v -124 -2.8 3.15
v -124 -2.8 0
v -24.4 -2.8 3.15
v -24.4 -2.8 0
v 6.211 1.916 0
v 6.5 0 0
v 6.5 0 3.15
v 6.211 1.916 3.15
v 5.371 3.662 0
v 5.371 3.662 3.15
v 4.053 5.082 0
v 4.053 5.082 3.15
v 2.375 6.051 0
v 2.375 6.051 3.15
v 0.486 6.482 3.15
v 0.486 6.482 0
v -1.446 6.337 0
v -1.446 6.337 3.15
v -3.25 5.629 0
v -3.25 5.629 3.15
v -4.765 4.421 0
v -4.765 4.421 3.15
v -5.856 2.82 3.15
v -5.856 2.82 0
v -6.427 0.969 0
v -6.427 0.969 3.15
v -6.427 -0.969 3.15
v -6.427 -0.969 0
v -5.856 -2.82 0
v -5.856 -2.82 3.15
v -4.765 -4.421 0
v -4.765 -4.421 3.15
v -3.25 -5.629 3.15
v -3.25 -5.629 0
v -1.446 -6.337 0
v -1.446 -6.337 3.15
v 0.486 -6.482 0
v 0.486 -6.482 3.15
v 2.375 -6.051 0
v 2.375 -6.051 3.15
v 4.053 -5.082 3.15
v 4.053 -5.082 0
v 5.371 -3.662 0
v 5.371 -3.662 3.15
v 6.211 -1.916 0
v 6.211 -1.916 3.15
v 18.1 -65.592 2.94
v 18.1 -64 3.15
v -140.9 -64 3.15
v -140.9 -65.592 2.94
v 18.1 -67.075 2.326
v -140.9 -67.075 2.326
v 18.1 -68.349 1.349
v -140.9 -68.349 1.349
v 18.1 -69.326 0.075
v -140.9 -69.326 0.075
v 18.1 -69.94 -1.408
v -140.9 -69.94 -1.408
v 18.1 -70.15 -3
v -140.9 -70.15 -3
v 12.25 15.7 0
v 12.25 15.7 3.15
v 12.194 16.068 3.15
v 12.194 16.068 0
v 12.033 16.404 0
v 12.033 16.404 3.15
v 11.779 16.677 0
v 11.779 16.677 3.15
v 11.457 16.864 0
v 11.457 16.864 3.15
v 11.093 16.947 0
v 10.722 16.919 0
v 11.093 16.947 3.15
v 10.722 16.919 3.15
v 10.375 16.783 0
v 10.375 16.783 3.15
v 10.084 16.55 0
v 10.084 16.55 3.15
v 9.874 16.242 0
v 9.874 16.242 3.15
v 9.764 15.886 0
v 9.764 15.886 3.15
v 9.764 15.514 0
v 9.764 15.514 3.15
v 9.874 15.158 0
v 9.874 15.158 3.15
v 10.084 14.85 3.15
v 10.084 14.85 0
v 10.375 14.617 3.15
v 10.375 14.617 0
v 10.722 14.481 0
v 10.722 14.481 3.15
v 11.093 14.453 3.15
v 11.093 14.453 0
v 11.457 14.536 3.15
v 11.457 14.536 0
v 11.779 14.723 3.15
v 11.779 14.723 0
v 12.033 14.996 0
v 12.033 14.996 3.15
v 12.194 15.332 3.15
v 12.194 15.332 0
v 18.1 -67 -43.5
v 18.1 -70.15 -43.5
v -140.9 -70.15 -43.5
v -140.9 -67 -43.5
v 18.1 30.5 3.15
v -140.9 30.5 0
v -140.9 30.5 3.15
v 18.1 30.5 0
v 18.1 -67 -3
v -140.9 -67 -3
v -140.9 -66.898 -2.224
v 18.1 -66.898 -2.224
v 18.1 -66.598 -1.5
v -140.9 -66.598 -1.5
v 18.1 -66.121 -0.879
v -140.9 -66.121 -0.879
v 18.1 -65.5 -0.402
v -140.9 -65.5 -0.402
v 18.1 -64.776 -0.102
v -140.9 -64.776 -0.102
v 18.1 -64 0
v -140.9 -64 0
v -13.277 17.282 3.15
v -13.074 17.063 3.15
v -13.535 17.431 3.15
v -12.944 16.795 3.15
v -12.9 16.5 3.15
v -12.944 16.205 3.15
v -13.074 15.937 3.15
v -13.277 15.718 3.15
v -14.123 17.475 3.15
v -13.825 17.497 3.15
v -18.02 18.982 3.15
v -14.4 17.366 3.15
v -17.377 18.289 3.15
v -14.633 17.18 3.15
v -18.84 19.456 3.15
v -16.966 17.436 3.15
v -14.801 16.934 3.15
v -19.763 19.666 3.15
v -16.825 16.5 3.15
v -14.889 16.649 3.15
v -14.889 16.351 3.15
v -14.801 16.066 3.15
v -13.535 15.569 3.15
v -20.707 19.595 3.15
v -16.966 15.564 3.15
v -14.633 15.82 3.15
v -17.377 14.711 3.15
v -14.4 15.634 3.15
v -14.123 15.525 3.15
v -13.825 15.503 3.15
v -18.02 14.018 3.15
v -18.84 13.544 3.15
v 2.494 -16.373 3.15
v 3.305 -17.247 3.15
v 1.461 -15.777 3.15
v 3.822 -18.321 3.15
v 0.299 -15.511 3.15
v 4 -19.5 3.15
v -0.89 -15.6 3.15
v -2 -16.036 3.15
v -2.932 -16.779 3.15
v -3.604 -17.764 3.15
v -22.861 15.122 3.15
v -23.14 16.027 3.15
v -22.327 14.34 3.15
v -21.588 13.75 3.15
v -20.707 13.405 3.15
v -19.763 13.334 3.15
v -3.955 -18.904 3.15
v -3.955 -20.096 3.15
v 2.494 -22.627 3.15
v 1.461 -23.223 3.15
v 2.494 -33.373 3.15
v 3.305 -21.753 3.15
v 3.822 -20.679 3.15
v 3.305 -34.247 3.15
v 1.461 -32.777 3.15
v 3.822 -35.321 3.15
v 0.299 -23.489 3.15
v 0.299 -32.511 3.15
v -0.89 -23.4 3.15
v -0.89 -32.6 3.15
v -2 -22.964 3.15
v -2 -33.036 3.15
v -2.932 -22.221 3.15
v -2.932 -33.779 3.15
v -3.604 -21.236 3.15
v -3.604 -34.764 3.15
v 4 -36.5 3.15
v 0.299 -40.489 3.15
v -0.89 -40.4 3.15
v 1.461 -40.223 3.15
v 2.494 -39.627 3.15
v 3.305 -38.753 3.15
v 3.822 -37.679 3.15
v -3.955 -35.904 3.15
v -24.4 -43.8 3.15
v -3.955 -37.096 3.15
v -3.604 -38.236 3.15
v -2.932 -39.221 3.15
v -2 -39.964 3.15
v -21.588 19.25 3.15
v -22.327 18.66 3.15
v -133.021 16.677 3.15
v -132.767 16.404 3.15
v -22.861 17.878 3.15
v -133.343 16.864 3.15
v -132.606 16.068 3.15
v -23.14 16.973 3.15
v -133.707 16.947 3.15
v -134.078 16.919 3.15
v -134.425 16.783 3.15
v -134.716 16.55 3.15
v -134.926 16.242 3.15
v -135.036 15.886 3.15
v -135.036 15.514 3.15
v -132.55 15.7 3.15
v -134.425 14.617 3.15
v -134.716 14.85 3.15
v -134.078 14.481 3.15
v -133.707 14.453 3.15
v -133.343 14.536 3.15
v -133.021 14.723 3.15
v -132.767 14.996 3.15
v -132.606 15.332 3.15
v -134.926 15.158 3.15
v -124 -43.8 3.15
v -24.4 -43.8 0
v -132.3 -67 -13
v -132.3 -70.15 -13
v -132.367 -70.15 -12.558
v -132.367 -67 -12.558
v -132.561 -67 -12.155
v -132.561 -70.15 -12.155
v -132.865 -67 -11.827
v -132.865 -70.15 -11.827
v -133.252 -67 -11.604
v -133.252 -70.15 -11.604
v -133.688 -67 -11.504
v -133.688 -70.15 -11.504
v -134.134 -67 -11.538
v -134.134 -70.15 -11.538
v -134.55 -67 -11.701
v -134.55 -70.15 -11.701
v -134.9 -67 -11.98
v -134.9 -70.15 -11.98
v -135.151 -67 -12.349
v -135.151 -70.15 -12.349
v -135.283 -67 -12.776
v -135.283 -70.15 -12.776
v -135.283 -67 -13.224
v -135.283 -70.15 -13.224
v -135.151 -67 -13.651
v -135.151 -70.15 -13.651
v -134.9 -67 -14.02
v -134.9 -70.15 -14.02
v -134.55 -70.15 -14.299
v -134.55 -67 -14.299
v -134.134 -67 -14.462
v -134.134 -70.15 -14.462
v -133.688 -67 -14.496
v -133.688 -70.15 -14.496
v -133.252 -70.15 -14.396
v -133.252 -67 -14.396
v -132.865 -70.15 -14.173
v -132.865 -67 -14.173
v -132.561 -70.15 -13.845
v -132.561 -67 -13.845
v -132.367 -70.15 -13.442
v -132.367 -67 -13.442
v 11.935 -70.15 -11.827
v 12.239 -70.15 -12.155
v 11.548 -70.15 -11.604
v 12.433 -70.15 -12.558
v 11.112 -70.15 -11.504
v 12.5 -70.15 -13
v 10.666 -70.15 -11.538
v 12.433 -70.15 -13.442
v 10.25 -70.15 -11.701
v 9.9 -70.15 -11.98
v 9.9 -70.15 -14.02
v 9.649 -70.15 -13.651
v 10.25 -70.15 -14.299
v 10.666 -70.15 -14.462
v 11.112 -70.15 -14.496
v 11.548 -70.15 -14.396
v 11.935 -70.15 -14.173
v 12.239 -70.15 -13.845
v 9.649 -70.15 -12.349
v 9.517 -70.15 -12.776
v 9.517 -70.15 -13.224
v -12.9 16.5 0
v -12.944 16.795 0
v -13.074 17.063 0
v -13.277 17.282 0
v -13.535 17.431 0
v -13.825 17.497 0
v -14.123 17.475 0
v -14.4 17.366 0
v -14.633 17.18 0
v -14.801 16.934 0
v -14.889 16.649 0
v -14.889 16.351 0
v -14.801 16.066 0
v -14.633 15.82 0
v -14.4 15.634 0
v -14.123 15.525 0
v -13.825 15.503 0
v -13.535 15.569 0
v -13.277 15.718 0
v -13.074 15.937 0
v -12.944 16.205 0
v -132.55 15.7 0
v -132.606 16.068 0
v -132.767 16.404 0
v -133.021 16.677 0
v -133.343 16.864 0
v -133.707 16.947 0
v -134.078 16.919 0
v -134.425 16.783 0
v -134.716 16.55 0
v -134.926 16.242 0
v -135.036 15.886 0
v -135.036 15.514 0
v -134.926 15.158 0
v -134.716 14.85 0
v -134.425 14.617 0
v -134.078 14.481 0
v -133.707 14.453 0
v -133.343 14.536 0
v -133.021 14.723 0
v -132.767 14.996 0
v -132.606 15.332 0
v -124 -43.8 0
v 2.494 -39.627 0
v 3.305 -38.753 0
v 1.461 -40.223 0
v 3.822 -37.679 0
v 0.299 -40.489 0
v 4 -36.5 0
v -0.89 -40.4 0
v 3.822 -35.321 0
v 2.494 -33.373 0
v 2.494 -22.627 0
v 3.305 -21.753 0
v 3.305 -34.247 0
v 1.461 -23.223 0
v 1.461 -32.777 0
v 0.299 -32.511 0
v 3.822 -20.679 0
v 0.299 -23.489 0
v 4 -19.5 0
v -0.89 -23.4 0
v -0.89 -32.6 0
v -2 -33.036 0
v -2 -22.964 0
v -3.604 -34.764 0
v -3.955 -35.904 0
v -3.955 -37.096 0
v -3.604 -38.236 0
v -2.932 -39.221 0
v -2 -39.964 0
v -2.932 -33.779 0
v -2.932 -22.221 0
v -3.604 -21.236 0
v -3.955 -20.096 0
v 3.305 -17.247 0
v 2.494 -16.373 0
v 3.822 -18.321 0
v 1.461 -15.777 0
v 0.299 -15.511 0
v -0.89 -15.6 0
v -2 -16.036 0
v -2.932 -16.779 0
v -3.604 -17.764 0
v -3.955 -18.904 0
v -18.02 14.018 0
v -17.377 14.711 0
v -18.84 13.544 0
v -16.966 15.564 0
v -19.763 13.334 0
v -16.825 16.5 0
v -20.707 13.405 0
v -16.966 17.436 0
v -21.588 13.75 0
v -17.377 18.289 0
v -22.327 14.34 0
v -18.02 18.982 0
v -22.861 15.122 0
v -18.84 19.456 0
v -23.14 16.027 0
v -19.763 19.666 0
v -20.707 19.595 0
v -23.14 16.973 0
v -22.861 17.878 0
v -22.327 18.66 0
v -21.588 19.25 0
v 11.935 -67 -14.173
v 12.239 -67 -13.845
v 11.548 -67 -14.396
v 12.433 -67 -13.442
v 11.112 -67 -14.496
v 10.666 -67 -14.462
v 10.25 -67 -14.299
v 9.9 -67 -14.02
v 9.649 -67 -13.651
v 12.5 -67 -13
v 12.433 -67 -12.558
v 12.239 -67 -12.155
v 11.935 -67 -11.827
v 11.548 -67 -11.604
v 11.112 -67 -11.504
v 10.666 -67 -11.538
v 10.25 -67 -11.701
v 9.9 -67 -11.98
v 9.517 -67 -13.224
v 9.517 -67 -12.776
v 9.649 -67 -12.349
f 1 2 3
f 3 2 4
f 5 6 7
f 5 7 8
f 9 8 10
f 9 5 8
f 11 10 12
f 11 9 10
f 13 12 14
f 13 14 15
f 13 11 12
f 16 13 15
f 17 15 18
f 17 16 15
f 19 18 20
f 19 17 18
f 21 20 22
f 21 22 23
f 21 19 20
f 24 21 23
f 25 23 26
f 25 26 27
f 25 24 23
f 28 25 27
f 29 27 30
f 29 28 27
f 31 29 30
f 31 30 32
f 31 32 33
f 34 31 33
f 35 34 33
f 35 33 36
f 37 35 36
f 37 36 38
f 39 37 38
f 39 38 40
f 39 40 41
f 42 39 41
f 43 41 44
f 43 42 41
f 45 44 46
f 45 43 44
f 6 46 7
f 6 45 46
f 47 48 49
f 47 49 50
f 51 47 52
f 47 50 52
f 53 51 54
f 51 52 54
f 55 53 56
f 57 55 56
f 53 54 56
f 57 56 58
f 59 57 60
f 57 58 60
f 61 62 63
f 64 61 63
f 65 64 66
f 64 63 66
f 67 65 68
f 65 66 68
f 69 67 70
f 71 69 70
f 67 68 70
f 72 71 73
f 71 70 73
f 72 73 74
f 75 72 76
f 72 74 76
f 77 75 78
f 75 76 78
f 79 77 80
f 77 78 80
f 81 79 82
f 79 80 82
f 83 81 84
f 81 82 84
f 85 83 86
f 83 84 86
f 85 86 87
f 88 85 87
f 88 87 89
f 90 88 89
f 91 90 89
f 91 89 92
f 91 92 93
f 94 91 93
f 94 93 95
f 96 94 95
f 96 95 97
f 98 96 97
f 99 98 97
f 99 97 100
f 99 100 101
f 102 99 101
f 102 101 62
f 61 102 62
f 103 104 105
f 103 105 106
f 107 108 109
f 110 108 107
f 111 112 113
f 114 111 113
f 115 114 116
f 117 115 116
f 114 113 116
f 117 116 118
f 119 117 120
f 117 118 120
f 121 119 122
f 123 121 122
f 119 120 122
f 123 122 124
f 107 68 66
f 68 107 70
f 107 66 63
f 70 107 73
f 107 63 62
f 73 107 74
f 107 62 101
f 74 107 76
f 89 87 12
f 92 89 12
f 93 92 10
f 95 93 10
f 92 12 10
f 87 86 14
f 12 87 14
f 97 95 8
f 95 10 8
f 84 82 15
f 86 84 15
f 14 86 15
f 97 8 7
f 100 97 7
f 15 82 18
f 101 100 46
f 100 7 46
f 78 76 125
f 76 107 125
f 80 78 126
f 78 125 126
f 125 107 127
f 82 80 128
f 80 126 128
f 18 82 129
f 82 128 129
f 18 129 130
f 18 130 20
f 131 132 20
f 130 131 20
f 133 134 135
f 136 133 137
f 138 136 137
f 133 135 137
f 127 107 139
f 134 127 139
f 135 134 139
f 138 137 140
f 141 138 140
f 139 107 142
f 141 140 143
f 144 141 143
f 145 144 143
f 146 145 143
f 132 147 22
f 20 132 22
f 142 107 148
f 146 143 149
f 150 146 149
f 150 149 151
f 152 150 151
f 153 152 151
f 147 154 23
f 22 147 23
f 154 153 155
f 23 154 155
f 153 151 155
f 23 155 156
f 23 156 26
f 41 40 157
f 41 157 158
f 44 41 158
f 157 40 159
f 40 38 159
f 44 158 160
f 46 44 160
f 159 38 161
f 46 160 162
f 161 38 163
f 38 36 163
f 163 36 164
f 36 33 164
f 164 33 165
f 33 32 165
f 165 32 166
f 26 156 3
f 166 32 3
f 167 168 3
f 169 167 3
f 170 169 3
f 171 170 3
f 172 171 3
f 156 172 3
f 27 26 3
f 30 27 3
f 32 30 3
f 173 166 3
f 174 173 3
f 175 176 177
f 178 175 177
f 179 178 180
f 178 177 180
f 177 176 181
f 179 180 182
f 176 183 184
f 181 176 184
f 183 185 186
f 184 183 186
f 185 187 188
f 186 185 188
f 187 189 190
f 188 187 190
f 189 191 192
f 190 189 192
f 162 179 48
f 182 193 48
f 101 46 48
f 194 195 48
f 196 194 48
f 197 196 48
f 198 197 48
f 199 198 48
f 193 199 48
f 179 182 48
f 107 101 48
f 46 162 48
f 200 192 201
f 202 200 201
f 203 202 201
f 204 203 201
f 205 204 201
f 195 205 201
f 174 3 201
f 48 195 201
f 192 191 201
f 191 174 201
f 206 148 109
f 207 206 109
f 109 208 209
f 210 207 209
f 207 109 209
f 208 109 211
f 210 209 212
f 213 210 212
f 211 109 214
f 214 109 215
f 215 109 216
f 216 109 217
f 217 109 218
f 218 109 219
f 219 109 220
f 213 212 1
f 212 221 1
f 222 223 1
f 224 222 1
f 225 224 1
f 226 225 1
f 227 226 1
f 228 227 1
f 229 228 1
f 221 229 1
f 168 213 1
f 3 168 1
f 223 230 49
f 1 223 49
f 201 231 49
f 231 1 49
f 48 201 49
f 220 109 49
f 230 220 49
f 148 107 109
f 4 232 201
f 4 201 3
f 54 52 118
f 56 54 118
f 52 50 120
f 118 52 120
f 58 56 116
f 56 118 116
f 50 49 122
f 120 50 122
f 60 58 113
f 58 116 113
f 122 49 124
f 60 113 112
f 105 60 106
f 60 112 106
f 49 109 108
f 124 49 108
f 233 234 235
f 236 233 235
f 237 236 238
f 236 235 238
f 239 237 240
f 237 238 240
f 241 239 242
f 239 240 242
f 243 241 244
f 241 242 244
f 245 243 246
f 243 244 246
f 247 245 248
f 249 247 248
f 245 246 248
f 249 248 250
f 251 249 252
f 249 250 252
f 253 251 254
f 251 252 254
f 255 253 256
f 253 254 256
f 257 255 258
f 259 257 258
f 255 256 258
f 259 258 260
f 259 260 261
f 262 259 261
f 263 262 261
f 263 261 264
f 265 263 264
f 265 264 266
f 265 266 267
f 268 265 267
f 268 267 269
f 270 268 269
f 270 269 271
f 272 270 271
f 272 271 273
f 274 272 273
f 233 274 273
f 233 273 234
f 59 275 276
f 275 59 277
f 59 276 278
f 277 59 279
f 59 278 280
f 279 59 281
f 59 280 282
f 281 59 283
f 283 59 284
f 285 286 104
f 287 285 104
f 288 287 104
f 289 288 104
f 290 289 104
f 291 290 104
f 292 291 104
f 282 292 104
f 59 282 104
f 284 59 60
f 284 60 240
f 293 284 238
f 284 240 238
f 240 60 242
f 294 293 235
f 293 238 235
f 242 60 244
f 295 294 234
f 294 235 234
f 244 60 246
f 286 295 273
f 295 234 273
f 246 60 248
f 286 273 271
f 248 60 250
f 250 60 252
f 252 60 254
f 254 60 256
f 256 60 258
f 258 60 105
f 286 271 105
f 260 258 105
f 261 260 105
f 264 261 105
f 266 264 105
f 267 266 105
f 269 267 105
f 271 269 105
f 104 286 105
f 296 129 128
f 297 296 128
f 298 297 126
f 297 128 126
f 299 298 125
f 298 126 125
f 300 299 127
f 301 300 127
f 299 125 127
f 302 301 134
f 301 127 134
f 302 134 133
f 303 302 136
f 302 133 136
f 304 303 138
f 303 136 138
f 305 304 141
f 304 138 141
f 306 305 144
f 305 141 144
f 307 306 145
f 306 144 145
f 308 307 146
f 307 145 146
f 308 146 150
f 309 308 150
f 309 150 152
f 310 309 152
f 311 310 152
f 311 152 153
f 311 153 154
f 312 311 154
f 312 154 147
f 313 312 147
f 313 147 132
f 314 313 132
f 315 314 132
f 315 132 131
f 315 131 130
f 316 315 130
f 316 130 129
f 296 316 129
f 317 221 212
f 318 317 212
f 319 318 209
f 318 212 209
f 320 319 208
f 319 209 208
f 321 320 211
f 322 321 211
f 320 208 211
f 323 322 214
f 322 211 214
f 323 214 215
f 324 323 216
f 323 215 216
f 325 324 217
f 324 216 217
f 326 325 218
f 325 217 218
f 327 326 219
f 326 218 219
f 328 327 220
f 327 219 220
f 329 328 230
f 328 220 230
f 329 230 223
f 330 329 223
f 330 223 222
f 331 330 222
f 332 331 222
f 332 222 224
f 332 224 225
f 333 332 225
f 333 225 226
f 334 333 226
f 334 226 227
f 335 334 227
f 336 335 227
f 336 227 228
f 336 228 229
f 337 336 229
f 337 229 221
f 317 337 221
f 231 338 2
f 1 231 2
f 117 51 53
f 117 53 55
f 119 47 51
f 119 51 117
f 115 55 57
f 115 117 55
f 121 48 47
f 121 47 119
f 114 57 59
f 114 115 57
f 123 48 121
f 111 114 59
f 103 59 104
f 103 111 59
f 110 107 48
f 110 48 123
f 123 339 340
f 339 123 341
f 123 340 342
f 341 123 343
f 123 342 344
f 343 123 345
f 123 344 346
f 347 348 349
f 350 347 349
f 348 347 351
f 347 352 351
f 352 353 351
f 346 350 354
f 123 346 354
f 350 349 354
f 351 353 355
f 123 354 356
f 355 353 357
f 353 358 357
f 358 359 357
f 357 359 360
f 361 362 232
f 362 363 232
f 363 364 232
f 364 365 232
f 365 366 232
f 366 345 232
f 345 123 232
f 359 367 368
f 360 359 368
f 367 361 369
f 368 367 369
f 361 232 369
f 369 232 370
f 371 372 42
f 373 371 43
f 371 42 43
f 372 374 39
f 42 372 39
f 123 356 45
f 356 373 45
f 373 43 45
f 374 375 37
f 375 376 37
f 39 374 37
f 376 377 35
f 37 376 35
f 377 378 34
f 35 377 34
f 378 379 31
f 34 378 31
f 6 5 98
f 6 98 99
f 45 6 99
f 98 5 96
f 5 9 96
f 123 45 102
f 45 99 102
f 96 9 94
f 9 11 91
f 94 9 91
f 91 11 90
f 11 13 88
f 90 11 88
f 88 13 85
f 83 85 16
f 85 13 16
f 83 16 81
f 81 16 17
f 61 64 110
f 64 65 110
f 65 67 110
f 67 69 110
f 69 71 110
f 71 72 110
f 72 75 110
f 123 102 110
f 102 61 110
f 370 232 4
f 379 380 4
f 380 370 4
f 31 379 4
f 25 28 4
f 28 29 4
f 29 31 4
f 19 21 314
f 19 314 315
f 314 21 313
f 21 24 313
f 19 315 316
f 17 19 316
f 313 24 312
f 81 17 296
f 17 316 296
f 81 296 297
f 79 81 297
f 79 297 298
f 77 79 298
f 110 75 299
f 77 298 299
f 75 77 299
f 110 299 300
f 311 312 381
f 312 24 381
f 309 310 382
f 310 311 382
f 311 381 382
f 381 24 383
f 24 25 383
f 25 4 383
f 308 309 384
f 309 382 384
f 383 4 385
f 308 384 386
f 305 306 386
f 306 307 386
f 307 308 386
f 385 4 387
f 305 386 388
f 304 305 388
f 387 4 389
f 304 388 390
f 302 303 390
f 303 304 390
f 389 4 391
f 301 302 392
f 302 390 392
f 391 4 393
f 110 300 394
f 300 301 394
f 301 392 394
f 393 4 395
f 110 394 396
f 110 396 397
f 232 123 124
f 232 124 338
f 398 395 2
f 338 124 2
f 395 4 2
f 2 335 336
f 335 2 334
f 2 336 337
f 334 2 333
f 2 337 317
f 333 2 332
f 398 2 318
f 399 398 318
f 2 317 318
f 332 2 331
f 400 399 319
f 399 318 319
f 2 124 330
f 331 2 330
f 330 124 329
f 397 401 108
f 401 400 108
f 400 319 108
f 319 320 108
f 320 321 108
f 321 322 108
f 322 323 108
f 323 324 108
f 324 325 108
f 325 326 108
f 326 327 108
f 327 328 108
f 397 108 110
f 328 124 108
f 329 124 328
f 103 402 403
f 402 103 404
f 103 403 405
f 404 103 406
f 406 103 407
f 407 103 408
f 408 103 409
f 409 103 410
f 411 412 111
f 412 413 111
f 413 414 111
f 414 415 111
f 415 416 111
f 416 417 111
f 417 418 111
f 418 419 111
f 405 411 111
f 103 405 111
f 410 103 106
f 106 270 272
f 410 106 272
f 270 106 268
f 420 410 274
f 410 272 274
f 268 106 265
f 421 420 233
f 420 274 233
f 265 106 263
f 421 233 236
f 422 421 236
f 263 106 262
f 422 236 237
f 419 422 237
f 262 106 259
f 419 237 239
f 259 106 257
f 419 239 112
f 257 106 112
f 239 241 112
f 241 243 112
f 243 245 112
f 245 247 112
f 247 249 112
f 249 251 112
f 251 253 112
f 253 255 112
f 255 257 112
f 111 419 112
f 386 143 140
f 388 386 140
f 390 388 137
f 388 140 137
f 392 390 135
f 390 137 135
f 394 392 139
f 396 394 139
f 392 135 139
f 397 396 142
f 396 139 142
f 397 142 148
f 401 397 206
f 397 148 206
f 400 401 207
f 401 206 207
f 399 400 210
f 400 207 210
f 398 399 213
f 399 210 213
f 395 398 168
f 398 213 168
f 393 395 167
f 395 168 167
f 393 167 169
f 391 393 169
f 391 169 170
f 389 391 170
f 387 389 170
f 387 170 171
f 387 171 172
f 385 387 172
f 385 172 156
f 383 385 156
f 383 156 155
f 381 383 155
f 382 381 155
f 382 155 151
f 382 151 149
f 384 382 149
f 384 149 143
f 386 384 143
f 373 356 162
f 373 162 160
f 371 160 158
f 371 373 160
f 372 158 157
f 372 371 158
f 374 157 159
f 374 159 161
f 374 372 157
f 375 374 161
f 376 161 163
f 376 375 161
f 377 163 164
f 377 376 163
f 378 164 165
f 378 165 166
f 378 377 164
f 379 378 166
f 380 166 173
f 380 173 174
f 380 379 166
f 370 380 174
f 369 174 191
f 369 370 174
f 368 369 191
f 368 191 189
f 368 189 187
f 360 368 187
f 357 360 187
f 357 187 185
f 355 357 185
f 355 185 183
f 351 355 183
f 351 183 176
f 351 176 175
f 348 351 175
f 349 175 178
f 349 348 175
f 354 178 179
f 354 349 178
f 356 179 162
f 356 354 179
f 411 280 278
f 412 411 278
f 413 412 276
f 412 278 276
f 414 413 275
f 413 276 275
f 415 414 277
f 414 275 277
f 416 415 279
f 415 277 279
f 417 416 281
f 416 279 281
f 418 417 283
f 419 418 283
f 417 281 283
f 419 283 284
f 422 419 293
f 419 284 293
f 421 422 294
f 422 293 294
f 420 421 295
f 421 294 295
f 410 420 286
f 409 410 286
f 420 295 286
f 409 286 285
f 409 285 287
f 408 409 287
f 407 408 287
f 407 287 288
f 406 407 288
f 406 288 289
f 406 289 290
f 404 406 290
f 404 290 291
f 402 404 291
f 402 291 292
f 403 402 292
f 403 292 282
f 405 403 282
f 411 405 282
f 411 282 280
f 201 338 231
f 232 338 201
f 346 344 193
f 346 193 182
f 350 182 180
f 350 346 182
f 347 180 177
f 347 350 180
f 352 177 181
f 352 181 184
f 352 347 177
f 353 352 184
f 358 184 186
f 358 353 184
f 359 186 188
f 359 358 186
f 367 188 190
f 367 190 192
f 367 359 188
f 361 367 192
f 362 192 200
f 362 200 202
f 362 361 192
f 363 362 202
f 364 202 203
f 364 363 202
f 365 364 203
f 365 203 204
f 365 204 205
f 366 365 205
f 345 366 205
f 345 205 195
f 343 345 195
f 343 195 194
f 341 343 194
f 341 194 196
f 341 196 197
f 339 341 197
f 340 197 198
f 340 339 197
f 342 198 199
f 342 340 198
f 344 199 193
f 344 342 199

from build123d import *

# Parameters (mm, degrees)
SKETCH22_W          = 159
SKETCH22_H          = 90
SKETCH22_R          = 4
SKETCH22_R_2        = 6.5
SKETCH22_W_2        = 99.6
SKETCH22_H_2        = 41
BOSS_EXTRUDE1_DEPTH = 3.15
BOSS_EXTRUDE2_DEPTH = 159
SKETCH25_R          = 1.25
CUT_EXTRUDE1_DEPTH  = 47.65
SKETCH26_R          = 1.5
CUT_EXTRUDE2_DEPTH  = 101.65
SKETCH28_R          = 3.175
SKETCH28_R_2        = 1
CUT_EXTRUDE3_DEPTH  = 47.65


with BuildPart() as part:
    # Sketch22 → Boss-Extrude1 (new body)
    with BuildSketch(Plane.XY):
        with Locations((-61.4, -14.5)):
            Rectangle(SKETCH22_W, SKETCH22_H)
        with Locations((0, -19.5)):
            Circle(SKETCH22_R, mode=Mode.SUBTRACT)
        with Locations((0, -36.5)):
            Circle(SKETCH22_R, mode=Mode.SUBTRACT)
        Circle(SKETCH22_R_2, mode=Mode.SUBTRACT)
        with Locations((-74.2, -23.3)):
            Rectangle(SKETCH22_W_2, SKETCH22_H_2, mode=Mode.SUBTRACT)
    extrude(amount=BOSS_EXTRUDE1_DEPTH)

    # Sketch23 → Boss-Extrude2 (add)
    with BuildSketch(Plane.ZY.offset(140.9)):
        with BuildLine():
            Line((0, -59.5), (3.15, -59.5))
            Line((3.15, -59.5), (3.15, -64))
            ThreePointArc((3.15, -64), (1.348706704, -68.348706704), (-3, -70.15))
            Line((-3, -70.15), (-43.5, -70.15))
            Line((-43.5, -70.15), (-43.5, -67))
            Line((-43.5, -67), (-3, -67))
            ThreePointArc((-3, -67), (-0.878679656, -66.121320344), (0, -64))
            Line((0, -64), (0, -59.5))
        make_face()
    extrude(amount=-BOSS_EXTRUDE2_DEPTH)

    # Sketch25 → Cut-Extrude1 (cut, through all)
    with BuildSketch(Plane.XY.offset(3.15)):
        with Locations((-133.8, 15.7)):
            Circle(SKETCH25_R)
        with Locations((11, 15.7)):
            Circle(SKETCH25_R)
    extrude(amount=-CUT_EXTRUDE1_DEPTH, mode=Mode.SUBTRACT)

    # Sketch26 → Cut-Extrude2 (cut, through all)
    with BuildSketch(Plane.XZ.offset(70.15)):
        with Locations((-133.8, -13)):
            Circle(SKETCH26_R)
        with Locations((11, -13)):
            Circle(SKETCH26_R)
    extrude(amount=-CUT_EXTRUDE2_DEPTH, mode=Mode.SUBTRACT)

    # Sketch28 → Cut-Extrude3 (cut, through all)
    with BuildSketch(Plane.XY.offset(3.15)):
        with Locations((-20, 16.5)):
            Circle(SKETCH28_R)
        with Locations((-13.9, 16.5)):
            Circle(SKETCH28_R_2)
    extrude(amount=-CUT_EXTRUDE3_DEPTH, mode=Mode.SUBTRACT)


solid = part.part
